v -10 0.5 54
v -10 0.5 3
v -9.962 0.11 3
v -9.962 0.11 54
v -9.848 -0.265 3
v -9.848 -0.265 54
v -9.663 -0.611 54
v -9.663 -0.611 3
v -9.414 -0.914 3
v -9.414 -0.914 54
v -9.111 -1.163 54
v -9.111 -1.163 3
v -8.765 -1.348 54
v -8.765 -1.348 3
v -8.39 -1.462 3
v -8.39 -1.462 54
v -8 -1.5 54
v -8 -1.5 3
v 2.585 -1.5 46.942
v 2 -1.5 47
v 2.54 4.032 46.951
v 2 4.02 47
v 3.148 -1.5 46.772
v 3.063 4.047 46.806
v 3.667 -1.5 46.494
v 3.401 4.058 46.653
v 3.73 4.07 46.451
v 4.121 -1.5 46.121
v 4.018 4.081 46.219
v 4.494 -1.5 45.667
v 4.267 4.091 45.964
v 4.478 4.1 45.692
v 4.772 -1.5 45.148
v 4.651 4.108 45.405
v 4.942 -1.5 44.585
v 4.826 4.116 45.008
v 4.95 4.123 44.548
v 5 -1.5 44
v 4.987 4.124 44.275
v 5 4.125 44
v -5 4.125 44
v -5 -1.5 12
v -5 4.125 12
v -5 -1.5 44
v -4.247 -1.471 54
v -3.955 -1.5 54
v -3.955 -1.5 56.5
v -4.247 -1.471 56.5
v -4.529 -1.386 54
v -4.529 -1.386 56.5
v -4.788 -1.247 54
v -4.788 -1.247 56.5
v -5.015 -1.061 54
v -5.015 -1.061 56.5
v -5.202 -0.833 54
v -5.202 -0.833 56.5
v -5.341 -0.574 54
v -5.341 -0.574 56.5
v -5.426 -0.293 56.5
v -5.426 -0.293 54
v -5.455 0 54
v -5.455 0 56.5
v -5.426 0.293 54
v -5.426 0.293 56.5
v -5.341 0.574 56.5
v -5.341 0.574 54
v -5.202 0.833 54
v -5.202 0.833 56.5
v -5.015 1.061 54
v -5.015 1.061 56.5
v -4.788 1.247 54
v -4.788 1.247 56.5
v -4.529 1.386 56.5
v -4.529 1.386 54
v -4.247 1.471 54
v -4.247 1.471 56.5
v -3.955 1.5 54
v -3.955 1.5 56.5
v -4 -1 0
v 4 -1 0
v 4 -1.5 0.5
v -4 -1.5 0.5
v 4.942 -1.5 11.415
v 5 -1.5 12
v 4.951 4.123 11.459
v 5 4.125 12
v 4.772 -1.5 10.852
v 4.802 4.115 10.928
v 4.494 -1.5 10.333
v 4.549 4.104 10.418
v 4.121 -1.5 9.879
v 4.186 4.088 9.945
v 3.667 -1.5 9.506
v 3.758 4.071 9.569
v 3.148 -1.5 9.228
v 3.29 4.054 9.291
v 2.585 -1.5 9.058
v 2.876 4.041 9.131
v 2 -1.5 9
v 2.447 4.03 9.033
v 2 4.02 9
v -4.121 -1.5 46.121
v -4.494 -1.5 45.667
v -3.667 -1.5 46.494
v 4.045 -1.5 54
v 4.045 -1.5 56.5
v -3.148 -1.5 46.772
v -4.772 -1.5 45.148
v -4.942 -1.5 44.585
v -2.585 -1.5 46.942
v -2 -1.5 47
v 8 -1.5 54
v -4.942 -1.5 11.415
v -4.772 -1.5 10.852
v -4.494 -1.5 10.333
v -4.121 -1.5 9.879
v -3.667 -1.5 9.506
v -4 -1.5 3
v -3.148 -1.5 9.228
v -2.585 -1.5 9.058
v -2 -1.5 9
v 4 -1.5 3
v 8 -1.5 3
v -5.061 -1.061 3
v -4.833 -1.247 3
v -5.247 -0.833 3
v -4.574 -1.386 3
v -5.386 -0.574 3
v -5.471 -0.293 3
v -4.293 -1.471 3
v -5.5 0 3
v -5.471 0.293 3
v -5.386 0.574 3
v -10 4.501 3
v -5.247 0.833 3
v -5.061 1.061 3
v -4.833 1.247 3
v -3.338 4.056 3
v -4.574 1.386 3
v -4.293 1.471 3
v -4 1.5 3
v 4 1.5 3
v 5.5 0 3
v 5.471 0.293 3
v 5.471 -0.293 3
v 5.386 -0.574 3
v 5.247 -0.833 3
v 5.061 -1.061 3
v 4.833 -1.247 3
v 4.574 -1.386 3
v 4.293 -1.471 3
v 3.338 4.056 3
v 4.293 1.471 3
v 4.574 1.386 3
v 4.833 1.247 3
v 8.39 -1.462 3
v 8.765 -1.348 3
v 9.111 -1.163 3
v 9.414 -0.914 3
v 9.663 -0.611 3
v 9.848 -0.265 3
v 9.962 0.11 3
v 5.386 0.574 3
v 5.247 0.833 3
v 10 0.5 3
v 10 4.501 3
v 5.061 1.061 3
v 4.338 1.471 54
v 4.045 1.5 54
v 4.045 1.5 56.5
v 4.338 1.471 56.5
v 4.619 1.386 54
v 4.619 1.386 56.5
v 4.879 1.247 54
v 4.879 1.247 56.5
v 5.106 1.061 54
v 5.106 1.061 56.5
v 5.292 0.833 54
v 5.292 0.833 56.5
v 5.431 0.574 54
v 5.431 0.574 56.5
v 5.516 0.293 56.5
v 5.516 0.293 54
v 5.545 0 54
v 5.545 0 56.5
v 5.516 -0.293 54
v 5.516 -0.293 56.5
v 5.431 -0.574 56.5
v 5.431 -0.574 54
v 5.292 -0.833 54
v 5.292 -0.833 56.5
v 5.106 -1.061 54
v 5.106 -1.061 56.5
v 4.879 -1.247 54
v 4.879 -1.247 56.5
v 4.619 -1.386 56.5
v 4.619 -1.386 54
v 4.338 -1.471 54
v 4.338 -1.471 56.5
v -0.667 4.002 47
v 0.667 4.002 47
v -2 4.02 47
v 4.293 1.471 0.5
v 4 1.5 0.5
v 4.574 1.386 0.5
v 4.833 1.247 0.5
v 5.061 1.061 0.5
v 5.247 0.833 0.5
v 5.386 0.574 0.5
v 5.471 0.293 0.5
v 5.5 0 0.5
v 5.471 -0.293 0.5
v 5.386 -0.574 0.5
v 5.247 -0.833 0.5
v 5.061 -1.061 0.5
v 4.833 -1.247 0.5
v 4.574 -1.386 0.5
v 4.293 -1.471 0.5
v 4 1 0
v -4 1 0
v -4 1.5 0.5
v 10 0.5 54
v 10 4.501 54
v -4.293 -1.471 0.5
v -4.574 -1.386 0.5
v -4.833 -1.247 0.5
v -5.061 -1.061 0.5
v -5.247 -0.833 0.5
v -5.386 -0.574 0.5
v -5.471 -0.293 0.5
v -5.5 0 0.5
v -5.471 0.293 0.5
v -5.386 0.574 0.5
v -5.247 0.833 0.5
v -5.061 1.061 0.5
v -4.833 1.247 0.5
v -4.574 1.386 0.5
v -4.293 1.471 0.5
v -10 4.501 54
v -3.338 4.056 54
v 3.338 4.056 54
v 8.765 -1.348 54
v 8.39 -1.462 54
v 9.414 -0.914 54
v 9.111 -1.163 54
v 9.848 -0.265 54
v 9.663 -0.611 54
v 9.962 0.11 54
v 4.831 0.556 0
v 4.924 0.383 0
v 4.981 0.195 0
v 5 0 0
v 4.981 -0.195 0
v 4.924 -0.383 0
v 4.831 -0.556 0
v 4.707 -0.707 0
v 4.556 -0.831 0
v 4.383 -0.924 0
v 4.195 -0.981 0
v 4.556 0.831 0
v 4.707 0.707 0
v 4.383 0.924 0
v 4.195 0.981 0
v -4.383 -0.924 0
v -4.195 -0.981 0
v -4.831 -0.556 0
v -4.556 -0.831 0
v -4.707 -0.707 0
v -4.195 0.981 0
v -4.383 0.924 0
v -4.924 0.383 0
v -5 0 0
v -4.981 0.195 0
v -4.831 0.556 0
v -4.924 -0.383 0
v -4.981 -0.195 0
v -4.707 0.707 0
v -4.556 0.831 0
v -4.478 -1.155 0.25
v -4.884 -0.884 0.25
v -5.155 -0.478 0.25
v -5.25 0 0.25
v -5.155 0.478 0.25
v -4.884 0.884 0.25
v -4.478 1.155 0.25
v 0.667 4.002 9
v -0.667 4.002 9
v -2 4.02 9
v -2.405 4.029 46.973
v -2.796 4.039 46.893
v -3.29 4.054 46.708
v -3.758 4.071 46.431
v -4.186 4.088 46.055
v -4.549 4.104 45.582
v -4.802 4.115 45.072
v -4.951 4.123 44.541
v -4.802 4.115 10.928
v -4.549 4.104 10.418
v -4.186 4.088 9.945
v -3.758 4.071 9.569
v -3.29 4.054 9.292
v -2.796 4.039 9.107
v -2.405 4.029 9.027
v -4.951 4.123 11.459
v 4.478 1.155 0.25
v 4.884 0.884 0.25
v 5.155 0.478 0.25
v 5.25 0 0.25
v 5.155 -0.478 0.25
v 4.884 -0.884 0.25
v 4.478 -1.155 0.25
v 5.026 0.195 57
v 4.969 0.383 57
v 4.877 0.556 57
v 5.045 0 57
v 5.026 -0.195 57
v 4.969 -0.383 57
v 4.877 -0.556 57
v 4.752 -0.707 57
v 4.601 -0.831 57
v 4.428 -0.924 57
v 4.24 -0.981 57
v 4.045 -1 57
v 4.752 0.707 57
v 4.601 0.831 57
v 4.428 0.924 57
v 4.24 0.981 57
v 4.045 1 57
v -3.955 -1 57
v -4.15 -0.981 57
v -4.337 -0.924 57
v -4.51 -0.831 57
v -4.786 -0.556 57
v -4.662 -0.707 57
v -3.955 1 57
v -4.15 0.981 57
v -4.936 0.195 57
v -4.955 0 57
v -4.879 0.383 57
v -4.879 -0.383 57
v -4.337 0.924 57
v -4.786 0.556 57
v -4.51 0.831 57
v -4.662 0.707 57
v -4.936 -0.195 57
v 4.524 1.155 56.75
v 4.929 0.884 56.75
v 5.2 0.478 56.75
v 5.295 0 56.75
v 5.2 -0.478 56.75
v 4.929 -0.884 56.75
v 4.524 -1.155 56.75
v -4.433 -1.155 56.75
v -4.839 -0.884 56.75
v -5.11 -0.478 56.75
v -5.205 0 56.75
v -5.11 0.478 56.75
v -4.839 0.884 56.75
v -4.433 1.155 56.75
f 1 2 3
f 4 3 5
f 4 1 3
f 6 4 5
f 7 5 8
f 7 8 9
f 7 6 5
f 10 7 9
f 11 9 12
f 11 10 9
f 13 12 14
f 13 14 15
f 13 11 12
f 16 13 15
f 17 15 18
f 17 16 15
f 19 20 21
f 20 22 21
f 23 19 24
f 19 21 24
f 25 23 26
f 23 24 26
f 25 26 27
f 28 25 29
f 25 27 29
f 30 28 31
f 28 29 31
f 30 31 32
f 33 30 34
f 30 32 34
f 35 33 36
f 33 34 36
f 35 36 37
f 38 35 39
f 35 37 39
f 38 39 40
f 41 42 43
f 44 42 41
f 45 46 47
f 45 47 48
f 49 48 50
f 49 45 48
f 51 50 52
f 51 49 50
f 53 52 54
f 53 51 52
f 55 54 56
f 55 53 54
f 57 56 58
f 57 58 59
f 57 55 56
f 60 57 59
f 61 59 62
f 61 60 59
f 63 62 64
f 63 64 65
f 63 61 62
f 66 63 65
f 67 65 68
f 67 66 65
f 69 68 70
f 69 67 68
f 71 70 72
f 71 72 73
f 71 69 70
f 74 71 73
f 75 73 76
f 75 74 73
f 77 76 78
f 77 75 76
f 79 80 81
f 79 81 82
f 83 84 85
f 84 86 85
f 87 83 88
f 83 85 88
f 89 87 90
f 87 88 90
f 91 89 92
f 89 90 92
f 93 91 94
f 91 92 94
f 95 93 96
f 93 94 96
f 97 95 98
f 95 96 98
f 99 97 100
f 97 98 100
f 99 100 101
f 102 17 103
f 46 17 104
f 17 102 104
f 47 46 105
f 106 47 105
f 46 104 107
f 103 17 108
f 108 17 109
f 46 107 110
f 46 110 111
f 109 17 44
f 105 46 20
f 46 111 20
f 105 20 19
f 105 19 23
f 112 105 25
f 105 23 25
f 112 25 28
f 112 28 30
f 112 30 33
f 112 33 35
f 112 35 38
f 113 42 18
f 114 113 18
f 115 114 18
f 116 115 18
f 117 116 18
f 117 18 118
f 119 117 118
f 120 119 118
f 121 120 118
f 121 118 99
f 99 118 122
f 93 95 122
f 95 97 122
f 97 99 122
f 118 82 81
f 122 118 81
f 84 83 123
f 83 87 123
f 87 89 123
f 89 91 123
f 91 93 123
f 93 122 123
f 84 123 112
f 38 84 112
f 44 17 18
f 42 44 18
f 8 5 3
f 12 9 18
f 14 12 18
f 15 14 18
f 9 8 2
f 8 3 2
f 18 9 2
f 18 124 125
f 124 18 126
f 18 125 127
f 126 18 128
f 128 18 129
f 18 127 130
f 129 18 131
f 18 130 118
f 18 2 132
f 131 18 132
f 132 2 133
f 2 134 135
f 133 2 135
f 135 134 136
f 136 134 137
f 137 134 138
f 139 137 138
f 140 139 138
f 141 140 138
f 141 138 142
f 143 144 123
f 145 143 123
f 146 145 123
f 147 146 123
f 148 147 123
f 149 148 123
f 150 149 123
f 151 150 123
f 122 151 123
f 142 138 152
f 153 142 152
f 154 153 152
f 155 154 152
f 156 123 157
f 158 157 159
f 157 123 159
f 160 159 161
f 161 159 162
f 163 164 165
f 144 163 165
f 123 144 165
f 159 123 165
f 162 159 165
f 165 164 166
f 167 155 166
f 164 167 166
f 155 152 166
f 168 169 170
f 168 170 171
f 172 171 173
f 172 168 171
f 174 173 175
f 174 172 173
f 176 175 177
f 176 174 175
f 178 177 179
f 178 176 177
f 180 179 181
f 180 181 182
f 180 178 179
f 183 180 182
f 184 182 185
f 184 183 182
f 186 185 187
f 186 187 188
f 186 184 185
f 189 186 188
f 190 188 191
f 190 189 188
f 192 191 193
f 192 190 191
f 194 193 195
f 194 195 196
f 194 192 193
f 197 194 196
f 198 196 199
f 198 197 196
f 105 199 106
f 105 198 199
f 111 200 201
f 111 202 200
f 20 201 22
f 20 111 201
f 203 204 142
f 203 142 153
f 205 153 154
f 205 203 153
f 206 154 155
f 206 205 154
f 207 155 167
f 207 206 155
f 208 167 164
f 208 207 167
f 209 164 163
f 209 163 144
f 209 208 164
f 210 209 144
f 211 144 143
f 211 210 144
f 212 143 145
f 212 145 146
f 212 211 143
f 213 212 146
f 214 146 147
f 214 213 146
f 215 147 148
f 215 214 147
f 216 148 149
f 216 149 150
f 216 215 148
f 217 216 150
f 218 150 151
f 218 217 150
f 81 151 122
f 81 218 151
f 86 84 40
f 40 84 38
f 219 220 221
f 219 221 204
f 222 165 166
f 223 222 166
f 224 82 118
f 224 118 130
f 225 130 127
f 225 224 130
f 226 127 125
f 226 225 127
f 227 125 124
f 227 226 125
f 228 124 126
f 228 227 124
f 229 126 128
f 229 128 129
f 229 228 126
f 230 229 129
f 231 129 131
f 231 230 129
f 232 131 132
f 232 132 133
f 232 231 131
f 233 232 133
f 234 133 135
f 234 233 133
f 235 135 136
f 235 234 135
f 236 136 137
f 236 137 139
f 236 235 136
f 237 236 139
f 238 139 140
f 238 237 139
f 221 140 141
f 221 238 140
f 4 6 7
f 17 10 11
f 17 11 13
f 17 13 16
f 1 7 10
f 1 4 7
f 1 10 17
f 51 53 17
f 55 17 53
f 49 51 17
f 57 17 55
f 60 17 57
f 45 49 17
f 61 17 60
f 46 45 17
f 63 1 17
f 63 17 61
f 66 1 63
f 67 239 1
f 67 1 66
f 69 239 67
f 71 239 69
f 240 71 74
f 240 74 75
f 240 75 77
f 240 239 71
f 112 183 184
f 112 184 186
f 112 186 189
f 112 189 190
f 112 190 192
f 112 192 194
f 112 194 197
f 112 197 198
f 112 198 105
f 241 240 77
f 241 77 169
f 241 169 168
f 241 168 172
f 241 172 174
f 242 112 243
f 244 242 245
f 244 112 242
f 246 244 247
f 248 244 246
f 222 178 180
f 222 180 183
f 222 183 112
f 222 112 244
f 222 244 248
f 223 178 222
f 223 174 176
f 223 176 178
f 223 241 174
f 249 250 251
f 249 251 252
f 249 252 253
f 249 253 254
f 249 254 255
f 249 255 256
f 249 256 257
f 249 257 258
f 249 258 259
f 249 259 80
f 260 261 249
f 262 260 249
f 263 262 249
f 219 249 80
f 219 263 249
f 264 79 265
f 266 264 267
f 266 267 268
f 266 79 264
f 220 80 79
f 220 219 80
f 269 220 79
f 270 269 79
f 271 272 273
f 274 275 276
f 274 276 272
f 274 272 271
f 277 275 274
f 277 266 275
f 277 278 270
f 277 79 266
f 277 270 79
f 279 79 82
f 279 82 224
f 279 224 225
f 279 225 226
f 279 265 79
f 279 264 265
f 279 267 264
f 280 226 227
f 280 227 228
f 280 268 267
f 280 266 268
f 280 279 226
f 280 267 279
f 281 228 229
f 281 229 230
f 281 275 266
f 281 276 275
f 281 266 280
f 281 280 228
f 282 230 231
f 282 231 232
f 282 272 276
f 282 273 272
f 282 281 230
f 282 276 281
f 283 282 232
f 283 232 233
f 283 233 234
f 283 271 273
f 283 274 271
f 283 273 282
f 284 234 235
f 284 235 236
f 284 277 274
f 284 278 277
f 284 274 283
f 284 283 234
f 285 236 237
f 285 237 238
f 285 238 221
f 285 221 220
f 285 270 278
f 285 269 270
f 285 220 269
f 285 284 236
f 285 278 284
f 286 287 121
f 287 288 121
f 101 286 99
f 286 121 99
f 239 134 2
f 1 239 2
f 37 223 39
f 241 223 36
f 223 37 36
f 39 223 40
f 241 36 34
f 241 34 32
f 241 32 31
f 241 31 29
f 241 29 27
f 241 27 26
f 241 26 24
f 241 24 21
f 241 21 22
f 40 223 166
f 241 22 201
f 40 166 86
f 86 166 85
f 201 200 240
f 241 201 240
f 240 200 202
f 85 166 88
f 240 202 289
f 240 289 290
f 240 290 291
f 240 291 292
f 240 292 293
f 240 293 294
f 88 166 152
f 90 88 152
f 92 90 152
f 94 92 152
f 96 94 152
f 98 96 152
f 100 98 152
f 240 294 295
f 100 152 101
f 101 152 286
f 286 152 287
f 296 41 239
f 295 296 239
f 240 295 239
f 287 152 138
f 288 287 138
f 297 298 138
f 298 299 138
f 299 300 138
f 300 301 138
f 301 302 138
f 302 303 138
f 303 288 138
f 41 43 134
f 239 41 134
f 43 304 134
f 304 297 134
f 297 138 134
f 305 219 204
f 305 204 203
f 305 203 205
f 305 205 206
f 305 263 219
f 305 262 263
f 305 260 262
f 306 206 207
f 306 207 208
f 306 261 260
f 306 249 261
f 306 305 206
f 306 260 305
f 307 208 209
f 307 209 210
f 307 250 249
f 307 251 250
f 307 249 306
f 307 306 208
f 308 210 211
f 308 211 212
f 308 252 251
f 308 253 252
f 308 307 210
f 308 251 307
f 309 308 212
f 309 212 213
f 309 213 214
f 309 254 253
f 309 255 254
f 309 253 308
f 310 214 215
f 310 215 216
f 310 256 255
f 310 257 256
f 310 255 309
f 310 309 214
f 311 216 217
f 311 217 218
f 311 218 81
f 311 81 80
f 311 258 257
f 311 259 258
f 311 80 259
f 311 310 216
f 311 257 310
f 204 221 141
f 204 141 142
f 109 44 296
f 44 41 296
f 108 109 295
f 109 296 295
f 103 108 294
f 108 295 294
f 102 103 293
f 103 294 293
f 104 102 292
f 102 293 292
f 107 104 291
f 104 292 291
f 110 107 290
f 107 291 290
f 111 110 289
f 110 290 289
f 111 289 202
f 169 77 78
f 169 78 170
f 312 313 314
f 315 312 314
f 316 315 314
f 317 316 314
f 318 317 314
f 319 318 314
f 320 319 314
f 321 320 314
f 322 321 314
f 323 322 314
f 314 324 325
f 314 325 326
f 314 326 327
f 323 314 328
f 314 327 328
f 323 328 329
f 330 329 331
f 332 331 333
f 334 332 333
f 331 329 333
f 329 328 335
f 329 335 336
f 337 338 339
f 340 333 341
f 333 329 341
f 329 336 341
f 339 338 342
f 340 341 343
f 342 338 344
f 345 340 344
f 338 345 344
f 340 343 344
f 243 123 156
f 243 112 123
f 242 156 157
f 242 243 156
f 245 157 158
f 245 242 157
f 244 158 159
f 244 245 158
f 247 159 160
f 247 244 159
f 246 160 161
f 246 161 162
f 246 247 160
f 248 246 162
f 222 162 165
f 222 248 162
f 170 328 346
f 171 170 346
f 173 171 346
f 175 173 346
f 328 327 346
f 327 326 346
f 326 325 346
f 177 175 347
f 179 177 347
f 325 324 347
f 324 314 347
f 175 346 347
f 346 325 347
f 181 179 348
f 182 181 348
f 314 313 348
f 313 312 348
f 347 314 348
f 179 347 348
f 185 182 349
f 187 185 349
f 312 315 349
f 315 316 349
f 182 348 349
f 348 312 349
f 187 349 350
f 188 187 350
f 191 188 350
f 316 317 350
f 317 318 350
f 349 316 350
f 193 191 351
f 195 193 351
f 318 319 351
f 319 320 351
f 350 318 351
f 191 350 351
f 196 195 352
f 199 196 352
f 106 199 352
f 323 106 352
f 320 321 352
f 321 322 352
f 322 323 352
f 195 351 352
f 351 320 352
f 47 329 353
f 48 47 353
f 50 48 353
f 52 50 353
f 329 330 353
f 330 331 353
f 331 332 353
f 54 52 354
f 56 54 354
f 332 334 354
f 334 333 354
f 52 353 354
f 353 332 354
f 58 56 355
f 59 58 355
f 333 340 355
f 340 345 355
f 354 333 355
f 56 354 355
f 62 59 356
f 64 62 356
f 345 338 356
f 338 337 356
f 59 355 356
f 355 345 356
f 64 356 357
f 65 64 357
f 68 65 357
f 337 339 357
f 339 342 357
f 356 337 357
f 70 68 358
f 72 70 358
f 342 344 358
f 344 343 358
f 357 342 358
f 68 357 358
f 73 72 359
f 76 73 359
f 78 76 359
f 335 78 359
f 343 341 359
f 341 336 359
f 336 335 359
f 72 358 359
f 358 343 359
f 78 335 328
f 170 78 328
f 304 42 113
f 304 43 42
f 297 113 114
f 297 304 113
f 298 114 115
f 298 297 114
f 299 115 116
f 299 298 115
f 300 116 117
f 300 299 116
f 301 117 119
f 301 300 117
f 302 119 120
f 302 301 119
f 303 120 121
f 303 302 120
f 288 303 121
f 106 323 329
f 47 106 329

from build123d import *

# Parameters (mm, degrees)
EXTRUDE_1_DEPTH     = 3
EXTRUDE_2_DEPTH     = 51
EXTRUDE_3_DEPTH     = 3
FILLET_1_R          = 2
CHAMFER_1_SIZE      = 0.5
SKETCH_4_W          = 10
SKETCH_4_H          = 38
CUT_EXTRUDE_1_DEPTH = 59.180882402
FILLET_2_R          = 3


with BuildPart() as part:
    # 草图1 → 凸台-拉伸1 (new body)
    with BuildSketch(Plane.XY):
        with BuildLine():
            Line((-4, 1.5), (4, 1.5))
            ThreePointArc((4, 1.5), (5.5, 0), (4, -1.5))
            Line((4, -1.5), (-4, -1.5))
            ThreePointArc((-4, -1.5), (-5.5, 0), (-4, 1.5))
        make_face()
    extrude(amount=EXTRUDE_1_DEPTH)

    # 草图2 → 凸台-拉伸2 (add)
    with BuildSketch(Plane.XY.offset(3)):
        with BuildLine():
            Line((-10, 4.501256289), (-10, -1.5))
            Line((-10, -1.5), (-4, -1.5))
            ThreePointArc((-4, -1.5), (-5.5, 0), (-4, 1.5))
            Line((-4, 1.5), (4, 1.5))
            ThreePointArc((4, 1.5), (5.5, 0), (4, -1.5))
            Line((4, -1.5), (10, -1.5))
            Line((10, -1.5), (10, 4.501256289))
            ThreePointArc((10, 4.501256289), (0, 4), (-10, 4.501256289))
        make_face()
        with BuildLine():
            Line((4, 1.5), (-4, 1.5))
            ThreePointArc((-4, 1.5), (-5.5, 0), (-4, -1.5))
            Line((-4, -1.5), (4, -1.5))
            ThreePointArc((4, -1.5), (5.5, 0), (4, 1.5))
        make_face()
    extrude(amount=EXTRUDE_2_DEPTH)

    # 草图3 → 凸台-拉伸3 (add)
    with BuildSketch(Plane.XY.offset(54)):
        with BuildLine():
            Line((-3.954732622, 1.5), (4.045267378, 1.5))
            ThreePointArc((4.045267378, 1.5), (5.545267378, 0), (4.045267378, -1.5))
            Line((4.045267378, -1.5), (-3.954732622, -1.5))
            ThreePointArc((-3.954732622, -1.5), (-5.454732622, 0), (-3.954732622, 1.5))
        make_face()
    extrude(amount=EXTRUDE_3_DEPTH)

    # 圆角1
    fillet_1_edges = [part.edges().sort_by_distance(p)[0] for p in [
        (-10, -1.5, 28.5),
        (10, -1.5, 28.5),
    ]]
    fillet(fillet_1_edges, radius=FILLET_1_R)

    # 倒角1
    chamfer_1_edges = [part.edges().sort_by_distance(p)[0] for p in [
        (-5.454732622, 0, 57),
        (0.045267378, -1.5, 57),
        (5.545267378, 0, 57),
        (0.045267378, 1.5, 57),
        (0, 1.5, 0),
        (5.5, 0, 0),
        (0, -1.5, 0),
        (-5.5, 0, 0),
    ]]
    chamfer(chamfer_1_edges, length=CHAMFER_1_SIZE)

    # 草图4 → 切除-拉伸1 (cut, through all)
    with BuildSketch(Plane.XZ.offset(1.5)):
        with Locations((0, 28)):
            Rectangle(SKETCH_4_W, SKETCH_4_H)
    extrude(amount=-CUT_EXTRUDE_1_DEPTH, mode=Mode.SUBTRACT)

    # 圆角2
    fillet_2_edges = [part.edges().sort_by_distance(p)[0] for p in [
        (5, 1.312539111, 47),
        (5, 1.312539111, 9),
        (-5, 1.312539111, 9),
        (-5, 1.312539111, 47),
    ]]
    fillet(fillet_2_edges, radius=FILLET_2_R)


solid = part.part
